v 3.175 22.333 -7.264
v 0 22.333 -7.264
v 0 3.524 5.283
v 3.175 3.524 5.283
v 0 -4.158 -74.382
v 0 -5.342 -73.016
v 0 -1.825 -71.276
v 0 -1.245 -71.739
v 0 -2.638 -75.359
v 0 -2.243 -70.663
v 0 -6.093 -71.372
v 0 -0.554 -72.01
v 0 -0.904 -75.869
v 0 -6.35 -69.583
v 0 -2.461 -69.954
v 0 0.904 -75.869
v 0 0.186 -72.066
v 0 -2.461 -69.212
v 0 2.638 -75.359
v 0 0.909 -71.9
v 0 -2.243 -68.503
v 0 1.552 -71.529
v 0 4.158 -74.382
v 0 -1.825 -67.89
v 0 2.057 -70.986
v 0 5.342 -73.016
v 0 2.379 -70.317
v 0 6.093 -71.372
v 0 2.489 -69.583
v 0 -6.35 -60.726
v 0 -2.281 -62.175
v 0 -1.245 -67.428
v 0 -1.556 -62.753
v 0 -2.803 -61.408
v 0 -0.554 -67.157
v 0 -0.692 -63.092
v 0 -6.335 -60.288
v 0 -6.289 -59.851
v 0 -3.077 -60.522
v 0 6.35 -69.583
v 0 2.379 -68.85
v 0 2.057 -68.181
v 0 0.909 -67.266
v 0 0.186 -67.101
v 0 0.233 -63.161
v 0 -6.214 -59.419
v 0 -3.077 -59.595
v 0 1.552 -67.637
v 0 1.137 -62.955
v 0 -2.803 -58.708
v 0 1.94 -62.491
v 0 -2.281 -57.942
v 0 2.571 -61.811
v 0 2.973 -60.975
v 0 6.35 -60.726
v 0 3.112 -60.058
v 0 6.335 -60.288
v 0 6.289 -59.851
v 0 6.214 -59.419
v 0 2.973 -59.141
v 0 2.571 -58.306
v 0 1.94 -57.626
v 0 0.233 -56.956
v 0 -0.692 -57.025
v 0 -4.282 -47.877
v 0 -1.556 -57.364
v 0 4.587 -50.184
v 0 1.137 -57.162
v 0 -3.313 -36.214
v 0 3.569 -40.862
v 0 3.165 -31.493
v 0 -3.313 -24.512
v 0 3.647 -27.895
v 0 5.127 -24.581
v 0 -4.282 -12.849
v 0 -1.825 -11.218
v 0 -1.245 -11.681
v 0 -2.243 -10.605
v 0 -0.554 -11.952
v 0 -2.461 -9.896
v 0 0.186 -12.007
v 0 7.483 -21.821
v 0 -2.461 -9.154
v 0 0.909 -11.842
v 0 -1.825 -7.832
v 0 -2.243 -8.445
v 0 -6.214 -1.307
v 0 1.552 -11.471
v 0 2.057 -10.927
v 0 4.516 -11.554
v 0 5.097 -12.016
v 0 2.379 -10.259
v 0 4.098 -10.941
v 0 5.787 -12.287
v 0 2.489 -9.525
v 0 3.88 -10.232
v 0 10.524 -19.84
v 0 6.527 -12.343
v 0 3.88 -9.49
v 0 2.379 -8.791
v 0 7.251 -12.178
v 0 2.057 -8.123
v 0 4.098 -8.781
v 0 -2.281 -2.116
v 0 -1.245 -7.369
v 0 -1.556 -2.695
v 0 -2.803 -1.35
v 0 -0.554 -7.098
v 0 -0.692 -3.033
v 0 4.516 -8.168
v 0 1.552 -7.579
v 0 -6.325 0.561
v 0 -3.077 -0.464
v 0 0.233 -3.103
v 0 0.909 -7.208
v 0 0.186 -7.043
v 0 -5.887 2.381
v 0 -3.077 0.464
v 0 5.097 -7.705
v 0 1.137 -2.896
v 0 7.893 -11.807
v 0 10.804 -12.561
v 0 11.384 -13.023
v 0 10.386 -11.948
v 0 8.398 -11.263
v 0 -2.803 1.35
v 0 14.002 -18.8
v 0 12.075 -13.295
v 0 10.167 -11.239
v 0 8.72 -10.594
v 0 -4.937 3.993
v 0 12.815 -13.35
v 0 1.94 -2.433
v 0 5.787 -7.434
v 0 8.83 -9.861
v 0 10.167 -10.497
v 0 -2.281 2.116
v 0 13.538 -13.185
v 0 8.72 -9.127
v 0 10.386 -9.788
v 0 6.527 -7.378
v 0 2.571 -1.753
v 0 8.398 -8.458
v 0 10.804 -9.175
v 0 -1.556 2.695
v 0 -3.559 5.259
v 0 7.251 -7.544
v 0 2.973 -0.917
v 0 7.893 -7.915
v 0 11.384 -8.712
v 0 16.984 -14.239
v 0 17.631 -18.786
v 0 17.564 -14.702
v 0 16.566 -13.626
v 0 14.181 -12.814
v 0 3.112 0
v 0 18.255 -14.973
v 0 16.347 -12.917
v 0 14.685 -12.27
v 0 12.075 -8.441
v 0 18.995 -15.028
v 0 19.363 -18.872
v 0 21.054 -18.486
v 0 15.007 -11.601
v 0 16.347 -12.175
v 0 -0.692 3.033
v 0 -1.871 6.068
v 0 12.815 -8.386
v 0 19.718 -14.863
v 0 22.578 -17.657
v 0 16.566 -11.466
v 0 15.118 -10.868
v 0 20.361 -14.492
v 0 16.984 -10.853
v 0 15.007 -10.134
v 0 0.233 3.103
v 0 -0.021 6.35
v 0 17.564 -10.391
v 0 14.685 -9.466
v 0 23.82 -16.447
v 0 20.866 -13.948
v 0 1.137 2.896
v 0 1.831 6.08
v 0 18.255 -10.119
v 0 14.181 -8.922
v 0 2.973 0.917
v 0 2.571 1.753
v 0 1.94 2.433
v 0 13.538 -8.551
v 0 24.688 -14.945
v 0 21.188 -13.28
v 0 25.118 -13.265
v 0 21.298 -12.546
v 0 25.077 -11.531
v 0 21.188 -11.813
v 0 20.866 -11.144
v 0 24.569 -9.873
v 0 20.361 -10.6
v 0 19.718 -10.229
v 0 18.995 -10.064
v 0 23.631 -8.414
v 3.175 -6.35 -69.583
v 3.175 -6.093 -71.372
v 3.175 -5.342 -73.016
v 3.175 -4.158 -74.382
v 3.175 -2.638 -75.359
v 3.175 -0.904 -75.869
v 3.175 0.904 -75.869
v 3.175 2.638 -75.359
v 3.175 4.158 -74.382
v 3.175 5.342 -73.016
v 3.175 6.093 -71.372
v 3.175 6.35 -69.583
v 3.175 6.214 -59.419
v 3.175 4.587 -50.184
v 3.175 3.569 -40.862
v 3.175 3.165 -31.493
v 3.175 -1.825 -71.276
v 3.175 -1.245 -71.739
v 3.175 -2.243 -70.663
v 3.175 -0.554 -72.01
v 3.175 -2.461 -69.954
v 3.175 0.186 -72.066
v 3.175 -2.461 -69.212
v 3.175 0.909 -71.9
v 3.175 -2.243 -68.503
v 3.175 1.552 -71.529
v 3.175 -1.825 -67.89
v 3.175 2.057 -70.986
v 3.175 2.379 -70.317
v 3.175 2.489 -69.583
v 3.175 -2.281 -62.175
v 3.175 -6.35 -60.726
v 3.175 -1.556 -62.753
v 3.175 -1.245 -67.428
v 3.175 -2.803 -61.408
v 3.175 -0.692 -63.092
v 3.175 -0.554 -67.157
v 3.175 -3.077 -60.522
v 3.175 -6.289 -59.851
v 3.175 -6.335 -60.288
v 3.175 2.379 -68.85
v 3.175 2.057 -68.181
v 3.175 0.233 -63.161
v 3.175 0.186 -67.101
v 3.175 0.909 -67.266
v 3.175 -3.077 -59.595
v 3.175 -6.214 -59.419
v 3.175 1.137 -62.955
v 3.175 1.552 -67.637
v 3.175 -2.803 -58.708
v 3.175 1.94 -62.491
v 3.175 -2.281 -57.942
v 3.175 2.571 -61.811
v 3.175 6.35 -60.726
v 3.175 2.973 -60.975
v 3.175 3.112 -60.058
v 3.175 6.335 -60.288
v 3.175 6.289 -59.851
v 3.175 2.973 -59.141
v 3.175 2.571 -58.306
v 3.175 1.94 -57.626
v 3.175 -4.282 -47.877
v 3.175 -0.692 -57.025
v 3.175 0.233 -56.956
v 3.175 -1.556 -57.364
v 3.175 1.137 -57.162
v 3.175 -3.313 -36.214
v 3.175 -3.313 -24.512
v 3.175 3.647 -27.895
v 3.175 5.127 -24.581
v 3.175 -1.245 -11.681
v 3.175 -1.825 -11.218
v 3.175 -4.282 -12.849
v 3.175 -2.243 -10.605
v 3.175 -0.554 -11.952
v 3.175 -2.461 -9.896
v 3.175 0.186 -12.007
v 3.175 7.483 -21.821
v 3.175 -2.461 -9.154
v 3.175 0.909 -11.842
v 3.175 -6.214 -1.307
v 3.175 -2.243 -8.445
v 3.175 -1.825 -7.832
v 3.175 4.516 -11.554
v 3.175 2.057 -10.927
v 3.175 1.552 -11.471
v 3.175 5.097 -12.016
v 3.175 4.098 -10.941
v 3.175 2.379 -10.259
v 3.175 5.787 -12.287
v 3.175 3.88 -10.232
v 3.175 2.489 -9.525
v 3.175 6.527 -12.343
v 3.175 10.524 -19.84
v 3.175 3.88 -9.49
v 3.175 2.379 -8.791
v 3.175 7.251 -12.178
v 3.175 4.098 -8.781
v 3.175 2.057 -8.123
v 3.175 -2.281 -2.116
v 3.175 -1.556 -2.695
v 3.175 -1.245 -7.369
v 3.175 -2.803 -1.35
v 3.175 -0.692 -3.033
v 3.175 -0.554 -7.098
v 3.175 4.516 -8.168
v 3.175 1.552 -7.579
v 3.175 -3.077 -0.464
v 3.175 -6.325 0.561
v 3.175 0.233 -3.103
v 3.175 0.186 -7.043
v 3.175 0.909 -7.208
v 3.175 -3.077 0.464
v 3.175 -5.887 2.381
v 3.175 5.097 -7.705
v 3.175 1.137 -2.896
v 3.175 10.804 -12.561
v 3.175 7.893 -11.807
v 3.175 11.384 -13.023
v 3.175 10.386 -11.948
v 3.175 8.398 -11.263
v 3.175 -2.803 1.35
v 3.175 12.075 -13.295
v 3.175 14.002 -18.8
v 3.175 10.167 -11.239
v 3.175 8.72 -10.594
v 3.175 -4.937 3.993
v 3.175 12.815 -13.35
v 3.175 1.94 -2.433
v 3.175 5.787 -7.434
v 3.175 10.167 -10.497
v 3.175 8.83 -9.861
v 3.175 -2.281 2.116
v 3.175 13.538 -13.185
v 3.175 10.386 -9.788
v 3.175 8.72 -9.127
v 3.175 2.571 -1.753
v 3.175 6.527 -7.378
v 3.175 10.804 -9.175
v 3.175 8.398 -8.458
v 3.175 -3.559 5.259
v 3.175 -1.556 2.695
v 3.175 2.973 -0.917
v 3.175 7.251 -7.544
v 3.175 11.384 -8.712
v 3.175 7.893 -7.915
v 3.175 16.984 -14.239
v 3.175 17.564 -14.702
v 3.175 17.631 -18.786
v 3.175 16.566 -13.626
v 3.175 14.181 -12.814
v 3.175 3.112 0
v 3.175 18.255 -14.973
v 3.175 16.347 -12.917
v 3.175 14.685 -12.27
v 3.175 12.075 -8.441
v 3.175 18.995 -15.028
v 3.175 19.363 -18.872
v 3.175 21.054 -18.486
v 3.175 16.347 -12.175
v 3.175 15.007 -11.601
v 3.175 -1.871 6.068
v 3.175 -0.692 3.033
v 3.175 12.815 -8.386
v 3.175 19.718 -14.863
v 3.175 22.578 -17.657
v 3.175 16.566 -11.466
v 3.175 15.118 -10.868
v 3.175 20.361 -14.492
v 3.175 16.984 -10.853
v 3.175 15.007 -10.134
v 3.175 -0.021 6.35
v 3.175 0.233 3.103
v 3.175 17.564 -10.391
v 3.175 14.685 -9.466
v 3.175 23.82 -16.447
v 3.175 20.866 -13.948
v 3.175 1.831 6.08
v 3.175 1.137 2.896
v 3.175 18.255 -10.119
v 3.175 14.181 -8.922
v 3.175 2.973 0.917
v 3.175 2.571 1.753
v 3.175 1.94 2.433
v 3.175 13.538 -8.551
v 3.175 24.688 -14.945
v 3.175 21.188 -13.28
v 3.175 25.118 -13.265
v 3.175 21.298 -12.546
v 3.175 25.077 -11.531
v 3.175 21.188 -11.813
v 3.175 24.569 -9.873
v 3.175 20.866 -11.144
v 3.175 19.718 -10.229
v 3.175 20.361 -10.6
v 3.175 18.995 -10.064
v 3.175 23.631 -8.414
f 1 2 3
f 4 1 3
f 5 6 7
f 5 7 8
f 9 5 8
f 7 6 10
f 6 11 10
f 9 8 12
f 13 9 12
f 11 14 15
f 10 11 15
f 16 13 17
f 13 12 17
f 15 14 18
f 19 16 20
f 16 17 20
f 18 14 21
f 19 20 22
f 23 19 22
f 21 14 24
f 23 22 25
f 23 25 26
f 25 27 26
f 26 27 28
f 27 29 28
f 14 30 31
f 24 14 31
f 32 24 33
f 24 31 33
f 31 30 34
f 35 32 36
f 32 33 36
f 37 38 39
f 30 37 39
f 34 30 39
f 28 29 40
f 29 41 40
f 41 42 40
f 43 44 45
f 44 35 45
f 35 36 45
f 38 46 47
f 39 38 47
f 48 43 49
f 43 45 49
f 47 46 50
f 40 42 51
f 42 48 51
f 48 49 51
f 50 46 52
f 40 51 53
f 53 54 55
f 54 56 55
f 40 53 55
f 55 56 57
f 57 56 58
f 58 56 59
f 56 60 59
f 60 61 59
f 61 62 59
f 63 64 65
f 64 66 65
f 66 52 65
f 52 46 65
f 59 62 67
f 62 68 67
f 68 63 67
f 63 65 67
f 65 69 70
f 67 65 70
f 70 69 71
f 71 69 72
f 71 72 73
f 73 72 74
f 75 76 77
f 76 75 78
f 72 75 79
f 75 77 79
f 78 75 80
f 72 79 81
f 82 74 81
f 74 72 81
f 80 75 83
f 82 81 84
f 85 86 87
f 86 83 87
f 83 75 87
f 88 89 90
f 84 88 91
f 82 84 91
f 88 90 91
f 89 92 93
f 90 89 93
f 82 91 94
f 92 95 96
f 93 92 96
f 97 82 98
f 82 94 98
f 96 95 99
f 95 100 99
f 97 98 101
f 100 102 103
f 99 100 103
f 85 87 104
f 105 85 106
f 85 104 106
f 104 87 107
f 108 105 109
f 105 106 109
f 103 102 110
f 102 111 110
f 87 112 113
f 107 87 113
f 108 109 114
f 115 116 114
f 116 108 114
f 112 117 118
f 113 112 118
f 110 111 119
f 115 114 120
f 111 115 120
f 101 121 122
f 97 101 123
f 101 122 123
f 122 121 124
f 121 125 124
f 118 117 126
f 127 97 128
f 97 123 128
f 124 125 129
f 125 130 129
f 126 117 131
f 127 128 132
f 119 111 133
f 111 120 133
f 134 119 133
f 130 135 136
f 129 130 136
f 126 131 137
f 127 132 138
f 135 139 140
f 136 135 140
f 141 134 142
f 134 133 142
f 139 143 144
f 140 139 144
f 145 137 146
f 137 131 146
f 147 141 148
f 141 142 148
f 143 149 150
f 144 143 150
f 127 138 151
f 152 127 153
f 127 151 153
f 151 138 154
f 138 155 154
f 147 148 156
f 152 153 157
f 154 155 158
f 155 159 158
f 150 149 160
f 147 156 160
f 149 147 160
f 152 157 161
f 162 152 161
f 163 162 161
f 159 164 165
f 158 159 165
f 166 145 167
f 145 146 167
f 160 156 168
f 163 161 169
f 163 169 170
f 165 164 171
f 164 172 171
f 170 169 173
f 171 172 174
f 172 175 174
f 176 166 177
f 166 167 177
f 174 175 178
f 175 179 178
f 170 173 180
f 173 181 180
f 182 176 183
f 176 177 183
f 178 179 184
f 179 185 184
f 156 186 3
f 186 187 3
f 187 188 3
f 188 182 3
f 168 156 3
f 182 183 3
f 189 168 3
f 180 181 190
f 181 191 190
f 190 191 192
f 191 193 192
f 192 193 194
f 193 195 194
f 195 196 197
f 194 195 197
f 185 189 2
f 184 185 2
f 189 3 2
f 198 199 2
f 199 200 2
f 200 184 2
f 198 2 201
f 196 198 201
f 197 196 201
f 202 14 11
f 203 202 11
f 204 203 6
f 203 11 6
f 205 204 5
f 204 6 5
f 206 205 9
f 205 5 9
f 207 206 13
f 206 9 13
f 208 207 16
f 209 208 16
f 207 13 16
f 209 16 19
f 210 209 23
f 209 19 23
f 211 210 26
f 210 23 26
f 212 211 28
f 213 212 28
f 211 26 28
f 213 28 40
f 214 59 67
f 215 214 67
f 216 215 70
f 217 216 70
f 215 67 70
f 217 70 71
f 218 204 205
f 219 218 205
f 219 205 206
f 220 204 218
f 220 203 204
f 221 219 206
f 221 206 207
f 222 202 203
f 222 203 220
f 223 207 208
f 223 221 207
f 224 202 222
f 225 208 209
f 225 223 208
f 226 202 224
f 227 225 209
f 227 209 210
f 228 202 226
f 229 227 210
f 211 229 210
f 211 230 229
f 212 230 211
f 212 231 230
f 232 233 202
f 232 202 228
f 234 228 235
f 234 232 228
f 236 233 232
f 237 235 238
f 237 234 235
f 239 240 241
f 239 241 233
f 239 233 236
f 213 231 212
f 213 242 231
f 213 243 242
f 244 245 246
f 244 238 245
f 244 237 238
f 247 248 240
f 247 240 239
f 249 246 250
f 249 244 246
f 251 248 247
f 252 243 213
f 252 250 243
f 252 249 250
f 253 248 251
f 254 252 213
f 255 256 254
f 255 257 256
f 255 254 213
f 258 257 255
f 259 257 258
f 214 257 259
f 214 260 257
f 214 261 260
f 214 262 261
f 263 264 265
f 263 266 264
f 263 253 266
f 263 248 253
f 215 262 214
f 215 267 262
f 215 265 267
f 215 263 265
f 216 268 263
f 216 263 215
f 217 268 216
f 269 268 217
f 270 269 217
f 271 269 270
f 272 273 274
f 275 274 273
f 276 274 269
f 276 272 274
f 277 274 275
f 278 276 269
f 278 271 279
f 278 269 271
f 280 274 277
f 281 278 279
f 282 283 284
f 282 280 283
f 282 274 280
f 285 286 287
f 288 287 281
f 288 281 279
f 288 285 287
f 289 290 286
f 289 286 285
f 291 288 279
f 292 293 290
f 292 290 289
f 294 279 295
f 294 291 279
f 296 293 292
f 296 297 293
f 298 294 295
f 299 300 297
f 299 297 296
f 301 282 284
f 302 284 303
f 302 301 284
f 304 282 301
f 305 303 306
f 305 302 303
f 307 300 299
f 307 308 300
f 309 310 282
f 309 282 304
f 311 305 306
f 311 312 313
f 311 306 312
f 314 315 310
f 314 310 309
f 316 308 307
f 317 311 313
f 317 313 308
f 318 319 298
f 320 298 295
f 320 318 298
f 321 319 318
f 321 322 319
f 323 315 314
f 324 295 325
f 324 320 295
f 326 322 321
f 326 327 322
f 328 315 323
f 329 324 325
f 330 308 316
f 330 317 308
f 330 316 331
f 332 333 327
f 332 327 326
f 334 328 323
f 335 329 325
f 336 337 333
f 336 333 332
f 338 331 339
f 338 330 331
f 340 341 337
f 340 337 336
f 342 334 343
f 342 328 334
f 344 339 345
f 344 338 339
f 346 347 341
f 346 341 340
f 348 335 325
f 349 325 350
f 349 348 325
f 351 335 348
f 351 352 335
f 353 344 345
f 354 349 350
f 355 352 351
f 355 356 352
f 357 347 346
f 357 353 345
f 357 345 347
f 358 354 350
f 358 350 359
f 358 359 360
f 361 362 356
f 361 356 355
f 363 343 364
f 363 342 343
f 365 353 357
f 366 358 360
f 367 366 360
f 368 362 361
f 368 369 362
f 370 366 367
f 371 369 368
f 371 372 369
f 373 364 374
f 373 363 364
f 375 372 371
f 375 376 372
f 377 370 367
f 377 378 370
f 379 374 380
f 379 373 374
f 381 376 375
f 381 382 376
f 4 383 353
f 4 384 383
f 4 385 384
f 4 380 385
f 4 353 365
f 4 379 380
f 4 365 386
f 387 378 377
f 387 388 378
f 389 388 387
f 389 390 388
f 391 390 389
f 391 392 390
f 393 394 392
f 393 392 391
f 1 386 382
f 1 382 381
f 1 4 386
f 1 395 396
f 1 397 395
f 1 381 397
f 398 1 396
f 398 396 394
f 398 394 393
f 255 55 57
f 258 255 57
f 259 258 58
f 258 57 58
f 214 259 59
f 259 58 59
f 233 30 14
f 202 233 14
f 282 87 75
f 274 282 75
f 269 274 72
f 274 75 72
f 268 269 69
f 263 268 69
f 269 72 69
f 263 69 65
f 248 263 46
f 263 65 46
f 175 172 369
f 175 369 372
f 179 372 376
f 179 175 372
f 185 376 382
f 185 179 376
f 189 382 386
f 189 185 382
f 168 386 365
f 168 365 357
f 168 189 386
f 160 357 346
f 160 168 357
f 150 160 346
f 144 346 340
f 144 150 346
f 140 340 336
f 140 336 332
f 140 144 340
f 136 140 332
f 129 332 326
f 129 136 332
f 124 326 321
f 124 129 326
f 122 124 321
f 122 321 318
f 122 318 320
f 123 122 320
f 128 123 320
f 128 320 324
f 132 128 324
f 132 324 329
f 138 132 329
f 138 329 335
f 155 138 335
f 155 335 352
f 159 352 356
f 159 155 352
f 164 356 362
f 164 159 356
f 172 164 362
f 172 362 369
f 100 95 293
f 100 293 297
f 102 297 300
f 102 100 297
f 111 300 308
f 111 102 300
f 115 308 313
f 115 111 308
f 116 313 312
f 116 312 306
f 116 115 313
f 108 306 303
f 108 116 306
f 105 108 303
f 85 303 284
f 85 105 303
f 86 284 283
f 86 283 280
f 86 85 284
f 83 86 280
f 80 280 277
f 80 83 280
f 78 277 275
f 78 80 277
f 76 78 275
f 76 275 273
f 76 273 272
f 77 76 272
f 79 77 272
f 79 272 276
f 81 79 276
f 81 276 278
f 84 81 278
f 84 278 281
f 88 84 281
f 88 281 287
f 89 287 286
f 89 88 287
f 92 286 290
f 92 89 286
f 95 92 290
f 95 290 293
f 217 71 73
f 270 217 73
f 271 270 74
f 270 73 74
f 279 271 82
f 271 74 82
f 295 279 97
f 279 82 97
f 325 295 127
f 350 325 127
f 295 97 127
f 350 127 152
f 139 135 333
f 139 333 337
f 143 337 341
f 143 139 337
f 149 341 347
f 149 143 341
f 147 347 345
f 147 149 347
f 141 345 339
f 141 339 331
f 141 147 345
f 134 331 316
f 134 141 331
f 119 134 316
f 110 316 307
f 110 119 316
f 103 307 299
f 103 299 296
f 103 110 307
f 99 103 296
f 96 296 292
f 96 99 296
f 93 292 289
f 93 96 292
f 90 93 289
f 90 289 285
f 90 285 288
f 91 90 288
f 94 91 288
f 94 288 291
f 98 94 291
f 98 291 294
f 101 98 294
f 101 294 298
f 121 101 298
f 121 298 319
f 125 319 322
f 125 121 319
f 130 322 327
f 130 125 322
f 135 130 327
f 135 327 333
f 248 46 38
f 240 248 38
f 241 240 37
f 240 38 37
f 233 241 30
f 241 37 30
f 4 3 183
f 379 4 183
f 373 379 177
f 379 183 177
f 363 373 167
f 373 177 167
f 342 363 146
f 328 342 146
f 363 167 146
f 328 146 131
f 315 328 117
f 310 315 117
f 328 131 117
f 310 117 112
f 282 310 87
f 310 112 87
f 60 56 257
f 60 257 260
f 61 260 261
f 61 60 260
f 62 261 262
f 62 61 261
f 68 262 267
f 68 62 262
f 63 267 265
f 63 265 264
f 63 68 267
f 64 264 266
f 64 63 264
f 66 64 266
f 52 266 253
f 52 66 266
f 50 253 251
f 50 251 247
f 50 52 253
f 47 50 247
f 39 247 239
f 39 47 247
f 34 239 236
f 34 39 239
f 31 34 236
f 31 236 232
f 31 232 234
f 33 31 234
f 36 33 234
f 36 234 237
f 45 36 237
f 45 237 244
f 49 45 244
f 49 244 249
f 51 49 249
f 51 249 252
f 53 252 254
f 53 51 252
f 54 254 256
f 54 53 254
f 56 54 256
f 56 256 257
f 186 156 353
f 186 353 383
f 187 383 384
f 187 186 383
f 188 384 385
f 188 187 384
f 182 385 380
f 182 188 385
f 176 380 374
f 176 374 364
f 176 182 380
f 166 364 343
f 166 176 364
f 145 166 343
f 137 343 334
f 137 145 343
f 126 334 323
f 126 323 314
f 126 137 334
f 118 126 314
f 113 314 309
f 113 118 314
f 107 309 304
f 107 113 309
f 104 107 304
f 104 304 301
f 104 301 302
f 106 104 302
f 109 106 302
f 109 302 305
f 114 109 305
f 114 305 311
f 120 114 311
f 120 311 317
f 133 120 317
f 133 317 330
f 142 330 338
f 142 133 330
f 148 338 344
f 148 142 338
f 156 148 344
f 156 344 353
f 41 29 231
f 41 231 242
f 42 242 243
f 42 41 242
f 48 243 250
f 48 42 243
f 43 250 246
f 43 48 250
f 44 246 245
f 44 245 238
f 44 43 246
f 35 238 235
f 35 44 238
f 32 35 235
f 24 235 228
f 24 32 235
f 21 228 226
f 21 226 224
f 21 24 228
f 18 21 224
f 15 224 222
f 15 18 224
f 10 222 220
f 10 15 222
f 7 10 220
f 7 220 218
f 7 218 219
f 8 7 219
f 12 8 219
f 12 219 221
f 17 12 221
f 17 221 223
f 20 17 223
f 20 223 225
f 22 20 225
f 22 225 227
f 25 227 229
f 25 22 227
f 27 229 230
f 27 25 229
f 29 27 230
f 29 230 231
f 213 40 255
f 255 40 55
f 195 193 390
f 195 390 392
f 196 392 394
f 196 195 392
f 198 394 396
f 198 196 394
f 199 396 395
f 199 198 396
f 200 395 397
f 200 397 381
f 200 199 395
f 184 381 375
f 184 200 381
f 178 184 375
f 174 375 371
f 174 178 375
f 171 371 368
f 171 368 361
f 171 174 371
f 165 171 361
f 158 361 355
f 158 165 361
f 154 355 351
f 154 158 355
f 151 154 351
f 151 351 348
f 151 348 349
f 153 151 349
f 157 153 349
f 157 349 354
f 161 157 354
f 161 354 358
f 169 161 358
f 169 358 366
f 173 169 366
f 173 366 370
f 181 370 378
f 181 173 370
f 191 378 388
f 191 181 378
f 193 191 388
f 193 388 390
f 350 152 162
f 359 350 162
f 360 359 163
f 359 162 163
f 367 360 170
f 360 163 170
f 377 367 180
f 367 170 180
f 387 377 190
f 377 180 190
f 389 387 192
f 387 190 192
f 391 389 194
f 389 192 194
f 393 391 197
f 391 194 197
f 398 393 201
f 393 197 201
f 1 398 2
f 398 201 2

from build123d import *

# Parameters (mm, degrees)
F0_R     = 2.4892
F0_R_2   = 3.1115
F1_DEPTH = 3.175


# Not quite as in the source:
# - ends of sketch curves that miss each other by under 0.0002 mm in the source are joined


with BuildPart() as f1:
    # F0 (on Right) → F1 (new body)
    with BuildSketch(Plane.YZ):
        with BuildLine():
            Line((22.3326001159, -7.2636385381), (3.5237049527, 5.2826133121))
            ThreePointArc((3.5237049527, 5.2826133121), (-3.5587166415, 5.2590907831), (-6.2140895311, -1.3067483686))
            ThreePointArc((-6.2140895311, -1.3067483686), (-3.1920426976, -30.3630411987), (-6.2140895148, -59.419334071))
            ThreePointArc((-6.2140895148, -59.419334071), (-6.3159309852, -60.0691839024), (-6.35, -60.7260825175))
            Line((-6.35, -60.7260825175), (-6.35, -69.5833))
            ThreePointArc((-6.35, -69.5833), (0, -75.9333), (6.35, -69.5833))
            Line((6.35, -69.5833), (6.35, -60.7259096378))
            ThreePointArc((6.35, -60.7259096378), (6.3159401222, -60.069098879), (6.2141258668, -59.419334071))
            ThreePointArc((6.2141258668, -59.419334071), (4.0014684949, -45.5311698082), (3.1652638563, -31.4927325362))
            ThreePointArc((3.1652638563, -31.4927325362), (7.4831947902, -21.8210036968), (17.6308936292, -18.7860284798))
            ThreePointArc((17.6308936292, -18.7860284798), (24.6882615086, -14.9453248745), (22.3326001159, -7.2636385381))
        make_face()
        with Locations((0, -69.5833)):
            Circle(F0_R, mode=Mode.SUBTRACT)
        with Locations((0, -60.0583)):
            Circle(F0_R_2, mode=Mode.SUBTRACT)
        with Locations((0, -9.525)):
            Circle(F0_R, mode=Mode.SUBTRACT)
        Circle(F0_R_2, mode=Mode.SUBTRACT)
        with Locations((6.3411204926, -9.86069465)):
            Circle(F0_R, mode=Mode.SUBTRACT)
        with Locations((12.6288141023, -10.8677786001)):
            Circle(F0_R, mode=Mode.SUBTRACT)
        with Locations((18.8088951631, -12.5462518503)):
            Circle(F0_R, mode=Mode.SUBTRACT)
    extrude(amount=F1_DEPTH)


solid = f1.part
